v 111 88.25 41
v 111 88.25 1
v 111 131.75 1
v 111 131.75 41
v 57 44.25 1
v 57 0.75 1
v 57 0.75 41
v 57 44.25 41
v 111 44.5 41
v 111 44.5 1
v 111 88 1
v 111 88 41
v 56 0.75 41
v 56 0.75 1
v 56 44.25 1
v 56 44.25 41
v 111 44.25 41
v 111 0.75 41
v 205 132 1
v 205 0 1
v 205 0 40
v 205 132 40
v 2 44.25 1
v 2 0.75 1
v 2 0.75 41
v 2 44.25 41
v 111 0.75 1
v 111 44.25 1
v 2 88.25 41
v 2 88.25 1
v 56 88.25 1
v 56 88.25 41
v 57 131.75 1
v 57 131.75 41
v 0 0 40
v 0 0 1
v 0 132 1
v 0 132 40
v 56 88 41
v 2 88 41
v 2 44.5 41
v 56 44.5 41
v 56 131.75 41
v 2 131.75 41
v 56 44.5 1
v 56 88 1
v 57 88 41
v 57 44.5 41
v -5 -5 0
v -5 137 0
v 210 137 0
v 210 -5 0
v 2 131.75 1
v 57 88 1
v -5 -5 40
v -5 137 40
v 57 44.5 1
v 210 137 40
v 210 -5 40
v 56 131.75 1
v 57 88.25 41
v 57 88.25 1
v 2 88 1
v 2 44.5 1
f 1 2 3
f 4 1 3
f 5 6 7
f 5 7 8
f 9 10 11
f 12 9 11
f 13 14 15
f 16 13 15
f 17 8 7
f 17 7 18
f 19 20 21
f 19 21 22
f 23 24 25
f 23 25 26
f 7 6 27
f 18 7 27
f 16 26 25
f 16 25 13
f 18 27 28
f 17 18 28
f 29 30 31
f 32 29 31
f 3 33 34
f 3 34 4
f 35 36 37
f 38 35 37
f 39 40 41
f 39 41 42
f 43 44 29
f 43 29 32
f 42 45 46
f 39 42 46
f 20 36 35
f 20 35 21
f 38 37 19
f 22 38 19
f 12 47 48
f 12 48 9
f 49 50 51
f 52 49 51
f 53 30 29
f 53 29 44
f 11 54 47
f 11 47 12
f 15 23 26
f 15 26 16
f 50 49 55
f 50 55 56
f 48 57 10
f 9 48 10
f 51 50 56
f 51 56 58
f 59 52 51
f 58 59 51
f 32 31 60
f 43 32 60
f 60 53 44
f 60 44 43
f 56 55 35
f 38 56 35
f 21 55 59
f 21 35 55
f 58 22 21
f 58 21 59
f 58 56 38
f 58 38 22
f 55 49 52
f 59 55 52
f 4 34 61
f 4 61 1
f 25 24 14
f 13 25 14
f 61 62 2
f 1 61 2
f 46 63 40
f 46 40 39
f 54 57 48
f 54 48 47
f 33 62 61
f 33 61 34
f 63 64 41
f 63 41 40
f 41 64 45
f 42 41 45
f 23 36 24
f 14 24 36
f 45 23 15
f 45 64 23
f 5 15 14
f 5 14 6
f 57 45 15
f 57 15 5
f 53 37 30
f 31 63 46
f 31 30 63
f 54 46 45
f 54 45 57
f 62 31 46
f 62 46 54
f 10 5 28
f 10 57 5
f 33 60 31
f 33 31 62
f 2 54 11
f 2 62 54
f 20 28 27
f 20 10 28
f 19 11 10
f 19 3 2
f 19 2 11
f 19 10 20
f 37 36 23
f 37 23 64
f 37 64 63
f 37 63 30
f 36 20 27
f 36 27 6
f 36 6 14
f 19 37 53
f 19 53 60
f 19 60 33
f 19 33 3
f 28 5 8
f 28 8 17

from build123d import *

# Parameters (mm, degrees)
ESQUISSE1_W                     = 205
ESQUISSE1_H                     = 132
BOSS_EXTRU_1_DEPTH              = 1
ESQUISSE1_2_W                   = 215
ESQUISSE1_2_H                   = 142
ESQUISSE1_2_W_2                 = 205
ESQUISSE1_2_H_2                 = 132
EXTRU_MINCE1_DEPTH              = 40
ESQUISSE2_W                     = 54
ESQUISSE2_H                     = 43.5
BOSS_EXTRU_2_DEPTH              = 40
R_P_TITION_LIN_AIRE1_COUNT      = 3
R_P_TITION_LIN_AIRE1_PITCH      = 43.75
R_P_TITION_LIN_AIRE1_COUNT_DIR2 = 2
R_P_TITION_LIN_AIRE1_PITCH_DIR2 = 55


with BuildPart() as part:
    # Esquisse1 → Boss.-Extru.1 (new body)
    with BuildSketch(Plane.XY):
        with Locations((102.5, 66)):
            Rectangle(ESQUISSE1_W, ESQUISSE1_H)
    extrude(amount=BOSS_EXTRU_1_DEPTH)

    # Esquisse1<2> → Extru.-Mince1 (add)
    with BuildSketch(Plane.XY):
        with Locations((102.5, 66)):
            Rectangle(ESQUISSE1_2_W, ESQUISSE1_2_H)
        with Locations((102.5, 66)):
            Rectangle(ESQUISSE1_2_W_2, ESQUISSE1_2_H_2, mode=Mode.SUBTRACT)
    extrude(amount=EXTRU_MINCE1_DEPTH)

    # Esquisse2 → Boss.-Extru.2 (add)
    with BuildSketch(Plane.XY.offset(1)):
        with Locations((29, 110)):
            Rectangle(ESQUISSE2_W, ESQUISSE2_H)
    boss_extru_2 = extrude(amount=BOSS_EXTRU_2_DEPTH)

    # Répétition linéaire1: Boss.-Extru.2 3 × 2
    with Locations(*[(j * R_P_TITION_LIN_AIRE1_PITCH_DIR2, -i * R_P_TITION_LIN_AIRE1_PITCH, 0) for i in range(R_P_TITION_LIN_AIRE1_COUNT) for j in range(R_P_TITION_LIN_AIRE1_COUNT_DIR2) if (i, j) != (0, 0)]):
        add(boss_extru_2)


solid = part.part
